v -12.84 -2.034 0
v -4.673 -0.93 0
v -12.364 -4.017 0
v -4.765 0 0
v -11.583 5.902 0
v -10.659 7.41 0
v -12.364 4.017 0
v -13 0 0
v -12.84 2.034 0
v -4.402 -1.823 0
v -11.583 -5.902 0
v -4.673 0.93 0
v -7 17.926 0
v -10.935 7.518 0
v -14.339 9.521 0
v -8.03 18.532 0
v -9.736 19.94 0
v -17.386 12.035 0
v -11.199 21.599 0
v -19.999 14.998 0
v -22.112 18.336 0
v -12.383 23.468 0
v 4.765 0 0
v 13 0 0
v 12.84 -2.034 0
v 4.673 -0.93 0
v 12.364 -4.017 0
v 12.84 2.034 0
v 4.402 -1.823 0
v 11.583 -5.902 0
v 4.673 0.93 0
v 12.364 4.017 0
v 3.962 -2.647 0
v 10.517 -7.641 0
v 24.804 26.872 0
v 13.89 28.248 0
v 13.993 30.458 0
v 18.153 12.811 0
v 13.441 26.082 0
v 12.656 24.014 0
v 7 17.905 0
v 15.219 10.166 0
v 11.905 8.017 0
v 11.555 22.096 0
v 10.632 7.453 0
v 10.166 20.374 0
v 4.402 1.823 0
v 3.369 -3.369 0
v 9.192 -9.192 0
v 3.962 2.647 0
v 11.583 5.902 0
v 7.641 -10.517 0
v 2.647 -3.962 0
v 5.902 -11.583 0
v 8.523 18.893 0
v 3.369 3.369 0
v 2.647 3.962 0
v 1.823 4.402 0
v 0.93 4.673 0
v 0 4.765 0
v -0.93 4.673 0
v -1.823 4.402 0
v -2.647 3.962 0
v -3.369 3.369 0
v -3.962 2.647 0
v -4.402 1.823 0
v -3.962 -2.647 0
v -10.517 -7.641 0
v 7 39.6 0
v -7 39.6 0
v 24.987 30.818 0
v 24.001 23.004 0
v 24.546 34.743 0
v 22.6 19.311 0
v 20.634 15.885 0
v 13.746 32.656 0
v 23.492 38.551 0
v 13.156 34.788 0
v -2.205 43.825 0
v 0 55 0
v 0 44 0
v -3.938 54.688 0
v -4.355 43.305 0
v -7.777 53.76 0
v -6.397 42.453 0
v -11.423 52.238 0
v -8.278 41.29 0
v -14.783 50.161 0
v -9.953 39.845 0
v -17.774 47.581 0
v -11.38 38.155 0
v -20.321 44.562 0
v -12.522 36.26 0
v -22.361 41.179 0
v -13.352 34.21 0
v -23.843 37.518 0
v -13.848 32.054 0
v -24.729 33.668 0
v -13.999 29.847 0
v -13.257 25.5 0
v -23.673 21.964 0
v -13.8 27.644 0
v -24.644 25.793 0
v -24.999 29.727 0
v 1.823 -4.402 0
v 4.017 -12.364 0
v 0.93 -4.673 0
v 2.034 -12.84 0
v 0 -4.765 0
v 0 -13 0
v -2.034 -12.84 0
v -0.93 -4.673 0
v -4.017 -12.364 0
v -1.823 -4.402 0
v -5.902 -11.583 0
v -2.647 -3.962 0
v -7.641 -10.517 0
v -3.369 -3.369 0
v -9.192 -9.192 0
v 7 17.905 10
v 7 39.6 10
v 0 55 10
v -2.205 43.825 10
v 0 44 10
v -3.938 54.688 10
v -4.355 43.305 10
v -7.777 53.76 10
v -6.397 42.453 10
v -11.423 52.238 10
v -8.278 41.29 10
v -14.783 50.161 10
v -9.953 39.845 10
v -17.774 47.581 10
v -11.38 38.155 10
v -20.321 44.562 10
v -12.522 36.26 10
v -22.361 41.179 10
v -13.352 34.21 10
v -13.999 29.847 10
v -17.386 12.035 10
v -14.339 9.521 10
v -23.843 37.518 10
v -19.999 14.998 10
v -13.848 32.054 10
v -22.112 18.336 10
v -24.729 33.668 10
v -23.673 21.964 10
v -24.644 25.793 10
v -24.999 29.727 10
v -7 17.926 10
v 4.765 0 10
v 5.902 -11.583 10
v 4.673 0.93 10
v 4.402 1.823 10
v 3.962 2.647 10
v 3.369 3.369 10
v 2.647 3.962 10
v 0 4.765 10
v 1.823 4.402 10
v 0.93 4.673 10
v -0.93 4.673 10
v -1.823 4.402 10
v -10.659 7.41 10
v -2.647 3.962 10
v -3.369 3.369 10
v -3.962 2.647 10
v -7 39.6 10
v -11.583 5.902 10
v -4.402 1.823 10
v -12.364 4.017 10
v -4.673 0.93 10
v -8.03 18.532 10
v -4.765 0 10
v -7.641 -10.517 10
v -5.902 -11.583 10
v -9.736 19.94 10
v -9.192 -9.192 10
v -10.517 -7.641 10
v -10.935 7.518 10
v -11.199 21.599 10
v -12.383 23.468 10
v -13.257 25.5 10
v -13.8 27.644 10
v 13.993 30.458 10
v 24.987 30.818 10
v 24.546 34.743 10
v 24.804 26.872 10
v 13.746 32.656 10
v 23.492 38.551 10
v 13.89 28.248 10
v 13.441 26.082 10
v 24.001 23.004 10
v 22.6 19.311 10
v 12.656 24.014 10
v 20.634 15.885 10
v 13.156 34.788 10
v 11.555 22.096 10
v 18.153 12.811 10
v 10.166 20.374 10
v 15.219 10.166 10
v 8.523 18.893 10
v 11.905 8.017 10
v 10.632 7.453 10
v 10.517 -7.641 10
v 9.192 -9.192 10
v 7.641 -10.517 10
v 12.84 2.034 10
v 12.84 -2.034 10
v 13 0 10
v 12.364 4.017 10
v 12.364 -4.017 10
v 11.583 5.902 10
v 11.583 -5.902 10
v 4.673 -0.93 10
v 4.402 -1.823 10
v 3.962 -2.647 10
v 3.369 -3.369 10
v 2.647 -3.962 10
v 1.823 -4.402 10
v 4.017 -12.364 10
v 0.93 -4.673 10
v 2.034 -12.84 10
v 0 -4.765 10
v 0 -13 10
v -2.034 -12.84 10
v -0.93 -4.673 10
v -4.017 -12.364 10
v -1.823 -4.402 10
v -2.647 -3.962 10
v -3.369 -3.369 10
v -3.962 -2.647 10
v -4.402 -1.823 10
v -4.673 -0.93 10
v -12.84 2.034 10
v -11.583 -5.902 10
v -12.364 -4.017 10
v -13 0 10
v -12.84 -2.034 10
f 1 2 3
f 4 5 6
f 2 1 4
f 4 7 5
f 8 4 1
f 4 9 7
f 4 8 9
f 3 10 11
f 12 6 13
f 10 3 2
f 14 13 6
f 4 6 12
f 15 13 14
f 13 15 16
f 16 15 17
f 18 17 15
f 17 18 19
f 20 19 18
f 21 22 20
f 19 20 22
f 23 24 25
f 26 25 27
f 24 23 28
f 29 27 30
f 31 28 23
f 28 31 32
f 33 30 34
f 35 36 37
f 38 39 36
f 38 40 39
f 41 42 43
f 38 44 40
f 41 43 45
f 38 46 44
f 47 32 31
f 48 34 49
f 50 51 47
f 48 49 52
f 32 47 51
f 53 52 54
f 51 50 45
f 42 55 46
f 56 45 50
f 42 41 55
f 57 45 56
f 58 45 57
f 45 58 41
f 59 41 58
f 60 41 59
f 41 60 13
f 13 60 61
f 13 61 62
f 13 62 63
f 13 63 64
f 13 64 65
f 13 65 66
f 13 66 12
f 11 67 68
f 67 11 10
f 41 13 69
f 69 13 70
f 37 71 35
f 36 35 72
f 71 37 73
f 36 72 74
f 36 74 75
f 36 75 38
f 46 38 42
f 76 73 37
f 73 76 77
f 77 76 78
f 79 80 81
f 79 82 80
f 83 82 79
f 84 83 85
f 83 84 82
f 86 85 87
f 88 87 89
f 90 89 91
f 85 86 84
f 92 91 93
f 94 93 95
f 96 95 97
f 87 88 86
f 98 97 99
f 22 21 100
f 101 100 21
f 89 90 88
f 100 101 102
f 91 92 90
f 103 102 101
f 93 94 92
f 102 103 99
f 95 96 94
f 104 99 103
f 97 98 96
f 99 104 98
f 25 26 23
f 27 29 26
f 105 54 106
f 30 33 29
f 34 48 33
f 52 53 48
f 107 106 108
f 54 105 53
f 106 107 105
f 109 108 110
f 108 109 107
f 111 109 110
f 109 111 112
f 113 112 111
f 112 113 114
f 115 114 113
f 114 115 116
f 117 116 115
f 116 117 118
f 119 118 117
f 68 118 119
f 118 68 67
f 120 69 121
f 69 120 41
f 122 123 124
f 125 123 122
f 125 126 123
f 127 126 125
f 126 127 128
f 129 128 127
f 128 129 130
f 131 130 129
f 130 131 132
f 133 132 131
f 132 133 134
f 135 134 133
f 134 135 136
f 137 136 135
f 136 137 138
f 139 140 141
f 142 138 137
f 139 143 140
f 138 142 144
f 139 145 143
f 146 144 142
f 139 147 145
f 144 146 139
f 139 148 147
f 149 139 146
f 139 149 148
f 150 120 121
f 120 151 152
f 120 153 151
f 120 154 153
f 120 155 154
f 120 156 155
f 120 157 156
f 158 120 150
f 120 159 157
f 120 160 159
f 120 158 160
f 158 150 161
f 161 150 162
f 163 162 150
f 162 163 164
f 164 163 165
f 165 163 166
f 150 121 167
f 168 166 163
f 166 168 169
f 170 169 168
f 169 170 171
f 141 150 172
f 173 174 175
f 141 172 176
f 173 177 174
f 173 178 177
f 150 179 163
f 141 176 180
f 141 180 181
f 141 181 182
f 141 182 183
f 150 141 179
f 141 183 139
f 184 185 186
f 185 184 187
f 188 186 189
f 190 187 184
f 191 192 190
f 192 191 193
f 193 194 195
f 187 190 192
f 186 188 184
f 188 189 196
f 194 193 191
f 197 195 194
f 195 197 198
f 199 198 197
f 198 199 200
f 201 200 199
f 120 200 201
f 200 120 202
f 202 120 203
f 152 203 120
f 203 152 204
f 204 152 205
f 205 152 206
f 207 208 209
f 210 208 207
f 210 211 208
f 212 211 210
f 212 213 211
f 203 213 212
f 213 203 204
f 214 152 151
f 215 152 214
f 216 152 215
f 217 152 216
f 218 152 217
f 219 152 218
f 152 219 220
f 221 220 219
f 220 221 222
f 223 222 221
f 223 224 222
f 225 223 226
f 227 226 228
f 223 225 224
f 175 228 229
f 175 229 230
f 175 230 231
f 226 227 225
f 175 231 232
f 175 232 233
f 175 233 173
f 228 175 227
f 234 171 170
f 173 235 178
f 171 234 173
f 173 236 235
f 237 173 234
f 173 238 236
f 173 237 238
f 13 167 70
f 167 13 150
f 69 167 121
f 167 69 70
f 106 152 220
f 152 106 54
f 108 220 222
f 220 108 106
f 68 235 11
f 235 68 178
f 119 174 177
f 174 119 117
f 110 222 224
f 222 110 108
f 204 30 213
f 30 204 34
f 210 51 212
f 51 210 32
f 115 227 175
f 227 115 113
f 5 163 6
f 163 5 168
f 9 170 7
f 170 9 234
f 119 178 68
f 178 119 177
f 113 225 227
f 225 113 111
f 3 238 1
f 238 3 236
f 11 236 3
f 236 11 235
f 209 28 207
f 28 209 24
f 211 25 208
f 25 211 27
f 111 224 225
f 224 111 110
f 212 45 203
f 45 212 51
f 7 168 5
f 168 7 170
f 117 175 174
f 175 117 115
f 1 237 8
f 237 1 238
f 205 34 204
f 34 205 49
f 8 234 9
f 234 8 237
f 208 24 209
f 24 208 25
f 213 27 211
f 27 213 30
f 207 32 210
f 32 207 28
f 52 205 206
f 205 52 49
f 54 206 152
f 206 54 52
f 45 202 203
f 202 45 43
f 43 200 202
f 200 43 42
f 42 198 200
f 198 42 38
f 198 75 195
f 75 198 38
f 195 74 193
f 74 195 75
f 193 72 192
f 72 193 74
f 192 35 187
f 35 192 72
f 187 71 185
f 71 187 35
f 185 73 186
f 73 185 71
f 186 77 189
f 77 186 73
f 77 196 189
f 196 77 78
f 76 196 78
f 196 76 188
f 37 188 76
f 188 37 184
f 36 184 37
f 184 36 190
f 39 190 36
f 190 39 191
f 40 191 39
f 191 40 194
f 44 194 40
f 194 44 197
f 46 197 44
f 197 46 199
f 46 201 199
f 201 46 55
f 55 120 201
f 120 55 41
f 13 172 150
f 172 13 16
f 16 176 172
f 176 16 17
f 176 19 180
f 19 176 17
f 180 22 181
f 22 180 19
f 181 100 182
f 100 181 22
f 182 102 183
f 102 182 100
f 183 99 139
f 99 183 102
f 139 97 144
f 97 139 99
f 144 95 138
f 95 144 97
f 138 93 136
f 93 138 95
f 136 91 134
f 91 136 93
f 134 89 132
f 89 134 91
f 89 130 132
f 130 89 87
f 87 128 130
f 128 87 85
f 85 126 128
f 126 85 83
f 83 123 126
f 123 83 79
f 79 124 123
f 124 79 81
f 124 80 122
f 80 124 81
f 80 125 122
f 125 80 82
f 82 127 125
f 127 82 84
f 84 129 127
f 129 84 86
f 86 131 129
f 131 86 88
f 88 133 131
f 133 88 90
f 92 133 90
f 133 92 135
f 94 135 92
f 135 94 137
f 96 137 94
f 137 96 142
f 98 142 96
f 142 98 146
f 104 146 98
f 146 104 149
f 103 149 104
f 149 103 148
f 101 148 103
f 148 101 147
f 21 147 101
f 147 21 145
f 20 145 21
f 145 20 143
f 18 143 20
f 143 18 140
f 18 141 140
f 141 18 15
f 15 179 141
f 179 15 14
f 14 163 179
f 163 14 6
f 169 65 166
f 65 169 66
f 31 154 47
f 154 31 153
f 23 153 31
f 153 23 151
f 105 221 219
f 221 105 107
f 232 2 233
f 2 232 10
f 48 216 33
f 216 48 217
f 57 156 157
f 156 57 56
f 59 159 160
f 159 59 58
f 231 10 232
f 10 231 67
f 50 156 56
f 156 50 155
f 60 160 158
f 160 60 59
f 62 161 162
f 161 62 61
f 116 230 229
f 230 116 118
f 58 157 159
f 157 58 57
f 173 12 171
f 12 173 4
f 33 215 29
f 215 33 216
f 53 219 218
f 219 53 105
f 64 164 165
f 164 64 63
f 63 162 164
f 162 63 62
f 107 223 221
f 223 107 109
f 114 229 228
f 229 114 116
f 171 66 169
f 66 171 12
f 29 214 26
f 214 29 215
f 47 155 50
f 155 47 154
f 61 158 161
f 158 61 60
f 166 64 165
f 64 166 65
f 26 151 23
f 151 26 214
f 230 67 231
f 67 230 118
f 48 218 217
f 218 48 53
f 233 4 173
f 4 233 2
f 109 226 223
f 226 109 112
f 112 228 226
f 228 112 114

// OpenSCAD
$fn = 32;

// ----------------------------------------------------------------------
// Hook: 60 mm shank into a 14 mm curl, 10 mm thick
// ----------------------------------------------------------------------

// --- parameters (mm) ---
shank_len = 60;           // shank length from the boss centre
shank_w = 14;             // shank width
boss_d = 26;              // boss diameter
bore_d = 9.53;            // boss bore
curl_in = 14;             // curl inner radius
curl_out = 25;            // curl outer radius
curl_sweep = 290;         // curl sweep angle
hook_t = 10;              // hook thickness

shank_profile = [[-7, 39.6], [7, 39.6], [7, 11], [-7, 11]];
boss_profile = [[13, 0], [12.84, 2.034], [12.364, 4.017], [11.583, 5.902], [10.517, 7.641], [9.192, 9.192], [7.641, 10.517], [5.902, 11.583], [4.017, 12.364], [2.034, 12.84], [0, 13], [-2.034, 12.84], [-4.017, 12.364], [-5.902, 11.583], [-7.641, 10.517], [-9.192, 9.192], [-10.517, 7.641], [-11.583, 5.902], [-12.364, 4.017], [-12.84, 2.034], [-13, 0], [-12.84, -2.034], [-12.364, -4.017], [-11.583, -5.902], [-10.517, -7.641], [-9.192, -9.192], [-7.641, -10.517], [-5.902, -11.583], [-4.017, -12.364], [-2.034, -12.84], [0, -13], [2.034, -12.84], [4.017, -12.364], [5.902, -11.583], [7.641, -10.517], [9.192, -9.192], [10.517, -7.641], [11.583, -5.902], [12.364, -4.017], [12.84, -2.034]];
curl_profile = [[0, 55], [-3.938, 54.688], [-7.777, 53.76], [-11.423, 52.238], [-14.783, 50.161], [-17.774, 47.581], [-20.321, 44.562], [-22.361, 41.179], [-23.843, 37.518], [-24.729, 33.668], [-24.999, 29.727], [-24.644, 25.793], [-23.673, 21.964], [-22.112, 18.336], [-19.999, 14.998], [-17.386, 12.035], [-14.339, 9.521], [-10.935, 7.518], [-7.257, 6.076], [-3.398, 5.232], [0.545, 5.006], [4.475, 5.404], [8.294, 6.416], [11.905, 8.017], [15.219, 10.166], [18.153, 12.811], [20.634, 15.885], [22.6, 19.311], [24.001, 23.004], [24.804, 26.872], [24.987, 30.818], [24.546, 34.743], [23.492, 38.551], [13.156, 34.788], [13.746, 32.656], [13.993, 30.458], [13.89, 28.248], [13.441, 26.082], [12.656, 24.014], [11.555, 22.096], [10.166, 20.374], [8.523, 18.893], [6.667, 17.689], [4.644, 16.793], [2.506, 16.226], [0.305, 16.003], [-1.903, 16.13], [-4.064, 16.603], [-6.123, 17.41], [-8.03, 18.532], [-9.736, 19.94], [-11.199, 21.599], [-12.383, 23.468], [-13.257, 25.5], [-13.8, 27.644], [-13.999, 29.847], [-13.848, 32.054], [-13.352, 34.21], [-12.522, 36.26], [-11.38, 38.155], [-9.953, 39.845], [-8.278, 41.29], [-6.397, 42.453], [-4.355, 43.305], [-2.205, 43.825], [0, 44]];

difference() {
  union() {
    /* three overlapping outlines: shank, boss and the smooth curl */
    linear_extrude(height = hook_t) polygon(shank_profile);
    linear_extrude(height = hook_t) polygon(boss_profile);
    linear_extrude(height = hook_t) polygon(curl_profile);
  }
  translate([0, 0, -2.5]) cylinder(h = hook_t + 5, d = bore_d);
}
